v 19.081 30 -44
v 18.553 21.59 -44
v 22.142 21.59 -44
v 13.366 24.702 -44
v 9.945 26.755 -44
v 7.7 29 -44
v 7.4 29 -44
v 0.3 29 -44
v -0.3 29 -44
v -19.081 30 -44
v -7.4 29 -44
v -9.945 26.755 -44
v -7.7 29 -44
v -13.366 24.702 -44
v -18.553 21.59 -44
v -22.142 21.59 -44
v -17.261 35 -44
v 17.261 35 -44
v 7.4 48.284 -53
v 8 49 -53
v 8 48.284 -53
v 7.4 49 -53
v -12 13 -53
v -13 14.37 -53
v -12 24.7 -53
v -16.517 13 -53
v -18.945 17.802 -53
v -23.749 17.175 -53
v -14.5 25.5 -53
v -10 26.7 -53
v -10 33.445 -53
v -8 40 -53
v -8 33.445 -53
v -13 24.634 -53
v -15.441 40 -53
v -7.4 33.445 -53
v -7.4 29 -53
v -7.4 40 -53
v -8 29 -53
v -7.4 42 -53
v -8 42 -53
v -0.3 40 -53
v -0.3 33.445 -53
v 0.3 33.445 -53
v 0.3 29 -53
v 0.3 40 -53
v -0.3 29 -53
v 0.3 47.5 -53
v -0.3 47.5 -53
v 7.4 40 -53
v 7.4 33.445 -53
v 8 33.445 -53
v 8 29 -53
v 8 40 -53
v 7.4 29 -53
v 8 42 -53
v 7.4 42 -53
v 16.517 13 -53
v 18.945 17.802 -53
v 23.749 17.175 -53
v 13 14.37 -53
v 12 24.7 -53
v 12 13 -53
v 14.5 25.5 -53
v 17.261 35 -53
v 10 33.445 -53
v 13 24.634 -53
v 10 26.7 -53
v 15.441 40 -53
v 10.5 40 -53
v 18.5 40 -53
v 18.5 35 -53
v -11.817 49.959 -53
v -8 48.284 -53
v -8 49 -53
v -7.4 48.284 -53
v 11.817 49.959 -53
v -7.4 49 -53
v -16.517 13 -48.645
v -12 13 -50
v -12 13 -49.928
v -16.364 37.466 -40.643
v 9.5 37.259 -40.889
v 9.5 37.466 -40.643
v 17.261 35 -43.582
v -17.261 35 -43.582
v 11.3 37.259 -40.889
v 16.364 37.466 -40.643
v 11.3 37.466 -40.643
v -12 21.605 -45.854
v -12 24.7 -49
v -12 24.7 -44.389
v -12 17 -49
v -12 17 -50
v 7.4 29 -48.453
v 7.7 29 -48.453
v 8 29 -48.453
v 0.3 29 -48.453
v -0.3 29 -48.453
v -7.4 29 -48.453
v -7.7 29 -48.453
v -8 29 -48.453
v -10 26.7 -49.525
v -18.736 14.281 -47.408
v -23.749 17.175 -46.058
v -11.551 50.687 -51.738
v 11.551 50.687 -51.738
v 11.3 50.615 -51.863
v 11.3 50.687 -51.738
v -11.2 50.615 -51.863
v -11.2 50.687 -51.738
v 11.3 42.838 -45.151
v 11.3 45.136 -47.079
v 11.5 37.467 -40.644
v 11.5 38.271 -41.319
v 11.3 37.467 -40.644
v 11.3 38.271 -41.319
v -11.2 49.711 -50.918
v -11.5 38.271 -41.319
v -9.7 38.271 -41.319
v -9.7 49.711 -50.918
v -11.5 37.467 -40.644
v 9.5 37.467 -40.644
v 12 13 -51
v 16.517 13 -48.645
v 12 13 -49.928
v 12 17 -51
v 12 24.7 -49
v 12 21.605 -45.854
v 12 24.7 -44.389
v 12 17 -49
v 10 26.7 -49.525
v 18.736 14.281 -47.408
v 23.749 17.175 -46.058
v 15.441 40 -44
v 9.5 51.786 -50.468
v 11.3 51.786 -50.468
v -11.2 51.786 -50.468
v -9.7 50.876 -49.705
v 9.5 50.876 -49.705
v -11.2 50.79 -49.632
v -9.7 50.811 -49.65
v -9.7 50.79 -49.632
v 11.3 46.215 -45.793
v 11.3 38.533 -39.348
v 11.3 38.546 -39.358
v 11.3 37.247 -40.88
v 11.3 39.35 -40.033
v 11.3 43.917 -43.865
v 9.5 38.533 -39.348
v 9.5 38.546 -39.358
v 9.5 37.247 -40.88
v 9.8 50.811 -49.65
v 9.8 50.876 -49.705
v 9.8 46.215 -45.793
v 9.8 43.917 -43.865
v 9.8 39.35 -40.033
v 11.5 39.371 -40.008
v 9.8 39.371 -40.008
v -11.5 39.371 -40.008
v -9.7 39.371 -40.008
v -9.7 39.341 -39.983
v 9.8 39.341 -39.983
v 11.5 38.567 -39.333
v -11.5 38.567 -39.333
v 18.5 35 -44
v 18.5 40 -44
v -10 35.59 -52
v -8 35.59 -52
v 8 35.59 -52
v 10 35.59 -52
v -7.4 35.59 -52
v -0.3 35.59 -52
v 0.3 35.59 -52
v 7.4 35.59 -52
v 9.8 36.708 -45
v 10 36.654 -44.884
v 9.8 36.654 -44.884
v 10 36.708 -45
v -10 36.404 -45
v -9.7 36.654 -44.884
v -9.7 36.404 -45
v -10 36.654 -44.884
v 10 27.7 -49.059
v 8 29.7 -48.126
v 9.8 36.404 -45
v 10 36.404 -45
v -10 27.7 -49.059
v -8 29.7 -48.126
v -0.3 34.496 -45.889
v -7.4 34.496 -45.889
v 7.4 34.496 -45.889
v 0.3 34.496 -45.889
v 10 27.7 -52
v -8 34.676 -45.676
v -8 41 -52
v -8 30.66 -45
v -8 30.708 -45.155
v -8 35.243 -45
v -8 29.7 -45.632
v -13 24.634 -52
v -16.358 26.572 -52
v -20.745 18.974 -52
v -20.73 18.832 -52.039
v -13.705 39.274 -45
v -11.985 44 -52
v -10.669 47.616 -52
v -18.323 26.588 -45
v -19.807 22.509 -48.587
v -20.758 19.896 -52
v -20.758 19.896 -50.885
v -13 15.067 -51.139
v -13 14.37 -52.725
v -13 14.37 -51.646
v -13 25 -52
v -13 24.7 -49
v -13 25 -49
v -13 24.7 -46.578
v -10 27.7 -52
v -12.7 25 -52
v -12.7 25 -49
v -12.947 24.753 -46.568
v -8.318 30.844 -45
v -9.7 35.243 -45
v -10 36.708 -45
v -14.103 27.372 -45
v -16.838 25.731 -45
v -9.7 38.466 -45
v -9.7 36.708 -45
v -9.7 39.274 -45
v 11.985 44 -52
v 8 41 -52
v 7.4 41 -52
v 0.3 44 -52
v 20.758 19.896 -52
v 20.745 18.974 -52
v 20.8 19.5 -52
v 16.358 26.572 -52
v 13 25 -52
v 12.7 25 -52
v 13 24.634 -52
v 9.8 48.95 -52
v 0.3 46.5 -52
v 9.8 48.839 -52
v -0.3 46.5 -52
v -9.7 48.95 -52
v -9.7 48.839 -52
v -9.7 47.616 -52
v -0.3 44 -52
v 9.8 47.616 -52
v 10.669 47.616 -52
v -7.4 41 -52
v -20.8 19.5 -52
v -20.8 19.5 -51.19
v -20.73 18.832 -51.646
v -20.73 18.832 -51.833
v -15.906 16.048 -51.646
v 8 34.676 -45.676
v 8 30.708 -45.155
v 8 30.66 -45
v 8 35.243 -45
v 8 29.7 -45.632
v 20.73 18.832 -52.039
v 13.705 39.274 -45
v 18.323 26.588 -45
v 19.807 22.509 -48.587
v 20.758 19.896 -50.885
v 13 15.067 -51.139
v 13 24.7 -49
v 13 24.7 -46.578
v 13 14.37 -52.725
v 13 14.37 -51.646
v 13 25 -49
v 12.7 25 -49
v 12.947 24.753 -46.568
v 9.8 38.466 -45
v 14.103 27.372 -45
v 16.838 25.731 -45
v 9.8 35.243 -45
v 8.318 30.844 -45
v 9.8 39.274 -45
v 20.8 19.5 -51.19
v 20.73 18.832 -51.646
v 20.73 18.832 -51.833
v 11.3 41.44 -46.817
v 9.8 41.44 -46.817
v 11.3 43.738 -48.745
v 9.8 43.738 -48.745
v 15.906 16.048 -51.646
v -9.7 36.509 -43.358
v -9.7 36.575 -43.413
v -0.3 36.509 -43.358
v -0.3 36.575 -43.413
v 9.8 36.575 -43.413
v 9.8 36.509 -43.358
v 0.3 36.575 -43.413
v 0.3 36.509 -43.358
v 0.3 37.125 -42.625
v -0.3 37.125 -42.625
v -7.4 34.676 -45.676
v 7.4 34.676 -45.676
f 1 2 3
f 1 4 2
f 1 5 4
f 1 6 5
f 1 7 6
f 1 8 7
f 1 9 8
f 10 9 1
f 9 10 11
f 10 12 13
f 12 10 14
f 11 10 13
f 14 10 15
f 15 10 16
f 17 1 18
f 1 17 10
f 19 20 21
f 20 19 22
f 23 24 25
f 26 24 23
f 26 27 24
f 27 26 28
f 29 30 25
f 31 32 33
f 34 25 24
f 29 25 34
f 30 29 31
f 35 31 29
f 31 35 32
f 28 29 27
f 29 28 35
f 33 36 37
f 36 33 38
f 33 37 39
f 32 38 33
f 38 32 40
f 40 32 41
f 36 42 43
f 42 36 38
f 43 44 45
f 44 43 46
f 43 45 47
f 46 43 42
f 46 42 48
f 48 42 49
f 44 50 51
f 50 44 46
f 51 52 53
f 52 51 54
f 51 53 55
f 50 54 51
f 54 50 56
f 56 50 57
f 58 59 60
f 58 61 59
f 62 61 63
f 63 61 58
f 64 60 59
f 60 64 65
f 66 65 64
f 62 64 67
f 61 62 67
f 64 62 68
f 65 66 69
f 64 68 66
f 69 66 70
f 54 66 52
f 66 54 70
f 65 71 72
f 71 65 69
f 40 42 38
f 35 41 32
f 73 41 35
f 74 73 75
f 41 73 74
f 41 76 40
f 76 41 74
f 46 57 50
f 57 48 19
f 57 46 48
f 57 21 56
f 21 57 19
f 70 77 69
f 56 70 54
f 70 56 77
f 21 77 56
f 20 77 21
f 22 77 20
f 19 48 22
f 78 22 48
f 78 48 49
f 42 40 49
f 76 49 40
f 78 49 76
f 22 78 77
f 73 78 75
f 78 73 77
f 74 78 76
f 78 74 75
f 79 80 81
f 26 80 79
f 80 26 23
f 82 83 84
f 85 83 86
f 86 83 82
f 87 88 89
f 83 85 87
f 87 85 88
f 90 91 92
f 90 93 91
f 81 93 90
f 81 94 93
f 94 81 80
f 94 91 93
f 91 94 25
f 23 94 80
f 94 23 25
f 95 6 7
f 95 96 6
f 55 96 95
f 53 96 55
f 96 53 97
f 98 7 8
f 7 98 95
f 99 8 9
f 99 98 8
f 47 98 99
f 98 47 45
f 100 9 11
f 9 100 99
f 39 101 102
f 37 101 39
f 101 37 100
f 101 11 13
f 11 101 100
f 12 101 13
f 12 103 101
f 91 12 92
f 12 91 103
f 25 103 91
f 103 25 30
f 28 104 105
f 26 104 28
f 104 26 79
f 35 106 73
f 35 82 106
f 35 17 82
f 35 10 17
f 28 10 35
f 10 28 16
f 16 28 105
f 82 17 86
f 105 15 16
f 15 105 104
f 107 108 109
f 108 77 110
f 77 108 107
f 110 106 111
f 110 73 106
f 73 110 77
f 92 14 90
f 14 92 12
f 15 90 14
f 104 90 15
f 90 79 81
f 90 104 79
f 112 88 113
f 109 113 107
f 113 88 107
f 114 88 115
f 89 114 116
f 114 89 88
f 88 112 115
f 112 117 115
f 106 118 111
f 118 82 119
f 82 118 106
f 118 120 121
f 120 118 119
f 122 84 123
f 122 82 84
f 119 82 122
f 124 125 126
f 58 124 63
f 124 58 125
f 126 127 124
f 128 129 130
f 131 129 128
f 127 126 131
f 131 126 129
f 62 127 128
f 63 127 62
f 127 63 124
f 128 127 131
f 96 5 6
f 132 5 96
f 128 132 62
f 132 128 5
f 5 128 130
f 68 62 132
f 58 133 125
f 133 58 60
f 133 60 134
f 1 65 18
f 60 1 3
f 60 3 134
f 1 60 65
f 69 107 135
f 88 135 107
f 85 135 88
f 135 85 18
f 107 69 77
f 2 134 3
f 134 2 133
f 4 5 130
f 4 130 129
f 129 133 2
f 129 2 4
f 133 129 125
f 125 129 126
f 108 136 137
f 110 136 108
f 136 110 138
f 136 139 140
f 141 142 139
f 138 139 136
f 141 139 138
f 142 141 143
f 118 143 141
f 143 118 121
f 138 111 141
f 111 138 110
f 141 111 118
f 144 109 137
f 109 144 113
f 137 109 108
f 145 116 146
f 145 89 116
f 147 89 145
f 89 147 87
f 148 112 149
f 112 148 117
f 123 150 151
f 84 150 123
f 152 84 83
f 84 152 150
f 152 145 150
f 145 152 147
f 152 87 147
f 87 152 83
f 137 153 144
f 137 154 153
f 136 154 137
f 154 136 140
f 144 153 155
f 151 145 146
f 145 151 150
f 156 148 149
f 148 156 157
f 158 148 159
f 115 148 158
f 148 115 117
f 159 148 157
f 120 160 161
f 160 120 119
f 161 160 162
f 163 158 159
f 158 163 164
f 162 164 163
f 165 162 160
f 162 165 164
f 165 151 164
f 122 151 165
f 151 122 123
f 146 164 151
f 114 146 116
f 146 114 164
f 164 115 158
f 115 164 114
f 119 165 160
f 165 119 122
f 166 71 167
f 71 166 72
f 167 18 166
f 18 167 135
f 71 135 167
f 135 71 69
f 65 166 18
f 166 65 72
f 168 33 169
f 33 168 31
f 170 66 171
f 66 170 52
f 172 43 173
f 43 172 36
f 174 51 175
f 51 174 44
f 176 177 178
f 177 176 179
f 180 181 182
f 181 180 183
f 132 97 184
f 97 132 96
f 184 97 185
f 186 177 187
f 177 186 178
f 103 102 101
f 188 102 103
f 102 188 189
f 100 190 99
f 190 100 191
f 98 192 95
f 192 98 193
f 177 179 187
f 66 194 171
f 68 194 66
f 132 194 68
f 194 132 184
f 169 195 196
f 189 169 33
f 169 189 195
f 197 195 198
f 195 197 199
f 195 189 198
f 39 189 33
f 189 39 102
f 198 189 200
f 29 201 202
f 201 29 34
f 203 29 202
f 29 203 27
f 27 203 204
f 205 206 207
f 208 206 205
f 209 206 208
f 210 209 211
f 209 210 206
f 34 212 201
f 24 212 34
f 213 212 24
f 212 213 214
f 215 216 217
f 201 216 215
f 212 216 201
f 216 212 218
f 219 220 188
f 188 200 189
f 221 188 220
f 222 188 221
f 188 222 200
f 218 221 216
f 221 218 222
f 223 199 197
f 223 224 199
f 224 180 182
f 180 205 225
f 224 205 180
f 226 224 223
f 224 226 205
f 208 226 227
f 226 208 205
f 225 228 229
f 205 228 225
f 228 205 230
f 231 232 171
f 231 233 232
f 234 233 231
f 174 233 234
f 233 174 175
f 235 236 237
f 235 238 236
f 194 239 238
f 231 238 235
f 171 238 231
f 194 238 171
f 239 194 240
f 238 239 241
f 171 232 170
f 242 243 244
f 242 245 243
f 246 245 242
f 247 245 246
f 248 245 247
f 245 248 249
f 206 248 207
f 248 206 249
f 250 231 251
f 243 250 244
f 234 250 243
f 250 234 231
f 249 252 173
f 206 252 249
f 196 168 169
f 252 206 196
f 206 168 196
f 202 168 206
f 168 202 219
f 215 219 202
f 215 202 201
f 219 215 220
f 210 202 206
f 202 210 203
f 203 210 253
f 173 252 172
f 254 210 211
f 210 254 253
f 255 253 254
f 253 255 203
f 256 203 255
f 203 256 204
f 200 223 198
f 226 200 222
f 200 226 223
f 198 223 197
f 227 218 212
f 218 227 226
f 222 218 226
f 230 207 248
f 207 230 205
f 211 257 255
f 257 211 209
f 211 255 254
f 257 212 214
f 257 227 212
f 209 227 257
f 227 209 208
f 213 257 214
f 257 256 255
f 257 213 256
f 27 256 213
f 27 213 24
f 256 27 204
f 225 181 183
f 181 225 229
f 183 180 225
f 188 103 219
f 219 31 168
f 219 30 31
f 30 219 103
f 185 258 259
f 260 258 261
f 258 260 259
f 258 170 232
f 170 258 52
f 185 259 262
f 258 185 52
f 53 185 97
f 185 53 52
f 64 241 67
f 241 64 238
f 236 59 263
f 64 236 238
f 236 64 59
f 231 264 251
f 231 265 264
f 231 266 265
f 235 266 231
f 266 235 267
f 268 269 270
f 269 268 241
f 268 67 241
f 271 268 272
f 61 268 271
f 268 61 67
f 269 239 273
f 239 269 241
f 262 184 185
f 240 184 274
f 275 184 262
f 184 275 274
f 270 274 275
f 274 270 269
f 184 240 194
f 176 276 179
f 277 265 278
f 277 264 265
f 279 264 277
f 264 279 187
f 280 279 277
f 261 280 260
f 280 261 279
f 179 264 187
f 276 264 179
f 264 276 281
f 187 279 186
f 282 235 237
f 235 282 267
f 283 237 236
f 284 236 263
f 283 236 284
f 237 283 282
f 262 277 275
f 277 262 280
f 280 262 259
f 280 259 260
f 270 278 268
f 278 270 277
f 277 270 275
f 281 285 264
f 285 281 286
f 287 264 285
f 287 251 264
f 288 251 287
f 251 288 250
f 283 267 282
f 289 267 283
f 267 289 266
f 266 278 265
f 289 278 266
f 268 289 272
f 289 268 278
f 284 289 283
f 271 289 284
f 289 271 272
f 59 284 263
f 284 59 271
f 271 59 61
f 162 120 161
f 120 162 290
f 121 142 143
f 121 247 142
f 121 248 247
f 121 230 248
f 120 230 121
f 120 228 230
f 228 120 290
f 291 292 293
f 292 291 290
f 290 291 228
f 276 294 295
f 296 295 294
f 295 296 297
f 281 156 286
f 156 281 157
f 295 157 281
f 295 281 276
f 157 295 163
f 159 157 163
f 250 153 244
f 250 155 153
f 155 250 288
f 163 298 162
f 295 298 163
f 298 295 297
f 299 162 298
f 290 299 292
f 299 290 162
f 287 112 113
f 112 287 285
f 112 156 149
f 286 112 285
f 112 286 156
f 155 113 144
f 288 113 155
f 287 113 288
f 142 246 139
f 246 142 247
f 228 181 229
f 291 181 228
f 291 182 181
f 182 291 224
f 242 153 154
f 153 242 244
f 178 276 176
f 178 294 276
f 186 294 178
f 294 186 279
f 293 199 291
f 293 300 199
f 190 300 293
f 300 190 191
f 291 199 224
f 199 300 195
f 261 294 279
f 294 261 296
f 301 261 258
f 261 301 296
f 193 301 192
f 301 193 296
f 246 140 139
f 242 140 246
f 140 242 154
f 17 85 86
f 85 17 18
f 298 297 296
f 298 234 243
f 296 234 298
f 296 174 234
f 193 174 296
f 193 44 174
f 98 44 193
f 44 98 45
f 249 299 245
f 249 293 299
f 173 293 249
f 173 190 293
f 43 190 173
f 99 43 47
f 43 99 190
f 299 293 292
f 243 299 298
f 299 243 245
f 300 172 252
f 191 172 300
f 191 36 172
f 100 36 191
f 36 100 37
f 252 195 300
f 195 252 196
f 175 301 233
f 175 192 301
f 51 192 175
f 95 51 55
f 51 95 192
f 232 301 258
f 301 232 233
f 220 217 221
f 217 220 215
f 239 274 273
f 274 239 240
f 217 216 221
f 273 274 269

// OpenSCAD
// PRUSA iteration4
// nozzle-fan
// GNU GPL v3
// Josef Průša <iam@josefprusa.cz> and contributors
// http://www.reprap.org/wiki/Prusa_Mendel
// http://prusamendel.org


module fan()
    {
    cube([19.5,15,50]);
    translate([0,9.5,0]) cube([19.5,5.5,50]);
    translate([0,0,0]) cube([19.5,6,50]);
    translate([-1.50,6,0]) cube([1.5,3,50]);
    translate([9,-5,40]) cube([1,5.5,10]);
    }
   
module inner_half()
{
    difference()
    {
    union()
    {
        // outlets
        difference()
        {
            union()
            {
                translate([-8,12,-63]) rotate([25,0,0]) cube([18,30,6]);
                translate([-6,10.2,-60]) rotate([25,0,60]) cube([9,20,4]);
            }
            translate([-28,0,-55]) rotate([0,0,70]) cube([65,20,15]);
        }
        
        // inner body
        difference()
        {
            // base shape
            translate([-25,14,-52]) rotate([0,0,0]) cube([25,37,7]);
            translate([-14,2,-55]) rotate([0,0,60]) cube([10,20,15]);
            
            translate([-28,0,-55]) rotate([0,0,70]) cube([65,20,15]);
            difference()
            {
                // heatblock cut
                translate([-13,10,-55]) rotate([0,0,0]) cube([20,20,15]);
                translate([-16,21.7,-55]) rotate([0,0,45]) cube([20,20,15]);
            }
            
            // front shape
            translate([-8,15,-55]) rotate([25,0,0]) cube([16,30,6]);
            translate([-25,0,-55]) rotate([25,0,0]) cube([16,30,6]);
            translate([-15,51,-58]) rotate([45,0,0]) cube([16,30,6]);
        }
    }

        difference()
        {
            translate([-16.8,19.5,-55])cylinder(r=6,h = 12, $fn=30);         
            translate([-16.8,19.5,-55])cylinder(r=4,h = 30, $fn=30);         
            translate([-25,21,-58]) cube([20,20,16]);    
            translate([-18,11,-58]) cube([20,220,16]);    
        }    
        
        translate([-6,9,-56]) rotate([25,-15,60]) cube([20,25,5]);
        translate([-20,50,-54]) rotate([50,0,0]) cube([21,10,20]);
        translate([-14,2,-48]) rotate([0,50,60]) cube([10,25,18]);
        translate([-12,3.4,-60]) rotate([25,0,60]) cube([9,20,7]);
    }
}


module inner()
{
    difference()
    {
    union()
    {
    inner_half();
    mirror([1,0,0]) inner_half();

        // fan cut
        translate([9.8,48,-53]) rotate([40,0,180]) fan();
        difference()
            {
                translate([-9.7,41.65,-60.7]) rotate([50,0,0]) cube([9.75*2,20,15]);
                translate([-10,32,-67]) rotate([0,0,0]) cube([20,20,15]);
            }
    }
    translate([-20,44,-57])  cube([40,10,5]);
}
}

module outer_half()
{
    difference()
    {
        union()
        {
            translate([-25,13,-53]) rotate([0,0,0]) cube([25,39,9]);
            translate([-18,45,-55]) rotate([50,0,0]) cube([18,10,15]);
        }
        
        // front shape
        translate([-14,0,-55]) rotate([0,0,60]) cube([10,20,15]);
        
        // sides
        translate([-30,0,-55]) rotate([0,0,70]) cube([65,20,15]);
        difference()
        {
            translate([-12,9,-55]) rotate([0,0,0]) cube([20,20,15]);
            translate([-16,20.7,-55]) rotate([0,0,45]) cube([20,20,15]);
        }
        
        translate([-25,-2,-55]) rotate([25,0,0]) cube([16,30,6]);
        translate([-15,54,-58]) rotate([60,0,0]) cube([16,30,6]);
        translate([-6,8,-54]) rotate([25,-15,60]) cube([20,25,5]);
        
        translate([-20,51,-52]) rotate([50,0,0]) cube([21,10,20]);
        translate([-20,40,-63]) cube([21,10,10]);
    }
    
}


module outer()
{
    outer_half();
    mirror([1,0,0]) outer_half();
    translate([-11.2,50.5,-52]) rotate([50,0,0]) cube([22.5,2,1.3]);
    translate([9.5,50.5,-52]) rotate([50,0,0]) cube([1.8,2,17.3]);
    translate([-11.5,37.7,-42]) rotate([50,0,0]) cube([23,2.6,1.05]);
}



module nozzle_fan(mount=true)
{
difference()
    {
        union()
        {
            outer();
            if (mount) {
                translate([10.5,35,-53]) cube([8,5,17]);
            } else {
                translate([10.5,35,-53]) cube([8,5,9]);
            }
        }
        inner();
        if (mount) {
            translate([14.5,46,-40.5]) rotate([90,0,0]) cylinder(r=3,h=8,$fn=30); 
            translate([14.5,45,-40.5]) rotate([90,0,0]) cylinder(r=1.6,h=30,$fn=30); 
        } else {
            
        }
        
        translate([-25,30,-44]) cube([50,5,17]); 
    }

    // center fin
    difference()
    {
        translate([-0.3,29,-53]) cube([0.6,20,11]);
        translate([-2.5,35.5,-41]) rotate([-45,0,0]) cube([5,20,9]);
        translate([-2.5,26,-44]) cube([5,10,9]);
        translate([-2.5,26.5,-43]) cube([5,10,9]);
    }

    // right fin
    difference()
    {
        translate([-8,29,-53]) cube([0.6,20,11]);
        translate([-9,31,-42]) rotate([-45,0,0]) cube([5,20,14]);
        translate([-9,26,-44]) cube([5,10,9]);
        translate([-9,26.5,-43]) cube([5,10,9]);
    }

    // left fin
    difference()
    {
        translate([7.4,29,-53]) cube([0.6,20,11]);
        translate([7,31,-42]) rotate([-45,0,0]) cube([5,20,14]);
        translate([7,26,-44]) cube([5,10,9]);
        translate([7,26.5,-43]) cube([5,10,9]);
    }
    
        // front sides
        translate([-13,13,-53]) cube([1,12,3]);
        translate([12,13,-53]) cube([1,12,2]);
        translate([-13,17,-52]) cube([1,8,3]);
        translate([12,17,-52]) cube([1,8,3]);
}



//nozzle_fan();
nozzle_fan(mount=false);
